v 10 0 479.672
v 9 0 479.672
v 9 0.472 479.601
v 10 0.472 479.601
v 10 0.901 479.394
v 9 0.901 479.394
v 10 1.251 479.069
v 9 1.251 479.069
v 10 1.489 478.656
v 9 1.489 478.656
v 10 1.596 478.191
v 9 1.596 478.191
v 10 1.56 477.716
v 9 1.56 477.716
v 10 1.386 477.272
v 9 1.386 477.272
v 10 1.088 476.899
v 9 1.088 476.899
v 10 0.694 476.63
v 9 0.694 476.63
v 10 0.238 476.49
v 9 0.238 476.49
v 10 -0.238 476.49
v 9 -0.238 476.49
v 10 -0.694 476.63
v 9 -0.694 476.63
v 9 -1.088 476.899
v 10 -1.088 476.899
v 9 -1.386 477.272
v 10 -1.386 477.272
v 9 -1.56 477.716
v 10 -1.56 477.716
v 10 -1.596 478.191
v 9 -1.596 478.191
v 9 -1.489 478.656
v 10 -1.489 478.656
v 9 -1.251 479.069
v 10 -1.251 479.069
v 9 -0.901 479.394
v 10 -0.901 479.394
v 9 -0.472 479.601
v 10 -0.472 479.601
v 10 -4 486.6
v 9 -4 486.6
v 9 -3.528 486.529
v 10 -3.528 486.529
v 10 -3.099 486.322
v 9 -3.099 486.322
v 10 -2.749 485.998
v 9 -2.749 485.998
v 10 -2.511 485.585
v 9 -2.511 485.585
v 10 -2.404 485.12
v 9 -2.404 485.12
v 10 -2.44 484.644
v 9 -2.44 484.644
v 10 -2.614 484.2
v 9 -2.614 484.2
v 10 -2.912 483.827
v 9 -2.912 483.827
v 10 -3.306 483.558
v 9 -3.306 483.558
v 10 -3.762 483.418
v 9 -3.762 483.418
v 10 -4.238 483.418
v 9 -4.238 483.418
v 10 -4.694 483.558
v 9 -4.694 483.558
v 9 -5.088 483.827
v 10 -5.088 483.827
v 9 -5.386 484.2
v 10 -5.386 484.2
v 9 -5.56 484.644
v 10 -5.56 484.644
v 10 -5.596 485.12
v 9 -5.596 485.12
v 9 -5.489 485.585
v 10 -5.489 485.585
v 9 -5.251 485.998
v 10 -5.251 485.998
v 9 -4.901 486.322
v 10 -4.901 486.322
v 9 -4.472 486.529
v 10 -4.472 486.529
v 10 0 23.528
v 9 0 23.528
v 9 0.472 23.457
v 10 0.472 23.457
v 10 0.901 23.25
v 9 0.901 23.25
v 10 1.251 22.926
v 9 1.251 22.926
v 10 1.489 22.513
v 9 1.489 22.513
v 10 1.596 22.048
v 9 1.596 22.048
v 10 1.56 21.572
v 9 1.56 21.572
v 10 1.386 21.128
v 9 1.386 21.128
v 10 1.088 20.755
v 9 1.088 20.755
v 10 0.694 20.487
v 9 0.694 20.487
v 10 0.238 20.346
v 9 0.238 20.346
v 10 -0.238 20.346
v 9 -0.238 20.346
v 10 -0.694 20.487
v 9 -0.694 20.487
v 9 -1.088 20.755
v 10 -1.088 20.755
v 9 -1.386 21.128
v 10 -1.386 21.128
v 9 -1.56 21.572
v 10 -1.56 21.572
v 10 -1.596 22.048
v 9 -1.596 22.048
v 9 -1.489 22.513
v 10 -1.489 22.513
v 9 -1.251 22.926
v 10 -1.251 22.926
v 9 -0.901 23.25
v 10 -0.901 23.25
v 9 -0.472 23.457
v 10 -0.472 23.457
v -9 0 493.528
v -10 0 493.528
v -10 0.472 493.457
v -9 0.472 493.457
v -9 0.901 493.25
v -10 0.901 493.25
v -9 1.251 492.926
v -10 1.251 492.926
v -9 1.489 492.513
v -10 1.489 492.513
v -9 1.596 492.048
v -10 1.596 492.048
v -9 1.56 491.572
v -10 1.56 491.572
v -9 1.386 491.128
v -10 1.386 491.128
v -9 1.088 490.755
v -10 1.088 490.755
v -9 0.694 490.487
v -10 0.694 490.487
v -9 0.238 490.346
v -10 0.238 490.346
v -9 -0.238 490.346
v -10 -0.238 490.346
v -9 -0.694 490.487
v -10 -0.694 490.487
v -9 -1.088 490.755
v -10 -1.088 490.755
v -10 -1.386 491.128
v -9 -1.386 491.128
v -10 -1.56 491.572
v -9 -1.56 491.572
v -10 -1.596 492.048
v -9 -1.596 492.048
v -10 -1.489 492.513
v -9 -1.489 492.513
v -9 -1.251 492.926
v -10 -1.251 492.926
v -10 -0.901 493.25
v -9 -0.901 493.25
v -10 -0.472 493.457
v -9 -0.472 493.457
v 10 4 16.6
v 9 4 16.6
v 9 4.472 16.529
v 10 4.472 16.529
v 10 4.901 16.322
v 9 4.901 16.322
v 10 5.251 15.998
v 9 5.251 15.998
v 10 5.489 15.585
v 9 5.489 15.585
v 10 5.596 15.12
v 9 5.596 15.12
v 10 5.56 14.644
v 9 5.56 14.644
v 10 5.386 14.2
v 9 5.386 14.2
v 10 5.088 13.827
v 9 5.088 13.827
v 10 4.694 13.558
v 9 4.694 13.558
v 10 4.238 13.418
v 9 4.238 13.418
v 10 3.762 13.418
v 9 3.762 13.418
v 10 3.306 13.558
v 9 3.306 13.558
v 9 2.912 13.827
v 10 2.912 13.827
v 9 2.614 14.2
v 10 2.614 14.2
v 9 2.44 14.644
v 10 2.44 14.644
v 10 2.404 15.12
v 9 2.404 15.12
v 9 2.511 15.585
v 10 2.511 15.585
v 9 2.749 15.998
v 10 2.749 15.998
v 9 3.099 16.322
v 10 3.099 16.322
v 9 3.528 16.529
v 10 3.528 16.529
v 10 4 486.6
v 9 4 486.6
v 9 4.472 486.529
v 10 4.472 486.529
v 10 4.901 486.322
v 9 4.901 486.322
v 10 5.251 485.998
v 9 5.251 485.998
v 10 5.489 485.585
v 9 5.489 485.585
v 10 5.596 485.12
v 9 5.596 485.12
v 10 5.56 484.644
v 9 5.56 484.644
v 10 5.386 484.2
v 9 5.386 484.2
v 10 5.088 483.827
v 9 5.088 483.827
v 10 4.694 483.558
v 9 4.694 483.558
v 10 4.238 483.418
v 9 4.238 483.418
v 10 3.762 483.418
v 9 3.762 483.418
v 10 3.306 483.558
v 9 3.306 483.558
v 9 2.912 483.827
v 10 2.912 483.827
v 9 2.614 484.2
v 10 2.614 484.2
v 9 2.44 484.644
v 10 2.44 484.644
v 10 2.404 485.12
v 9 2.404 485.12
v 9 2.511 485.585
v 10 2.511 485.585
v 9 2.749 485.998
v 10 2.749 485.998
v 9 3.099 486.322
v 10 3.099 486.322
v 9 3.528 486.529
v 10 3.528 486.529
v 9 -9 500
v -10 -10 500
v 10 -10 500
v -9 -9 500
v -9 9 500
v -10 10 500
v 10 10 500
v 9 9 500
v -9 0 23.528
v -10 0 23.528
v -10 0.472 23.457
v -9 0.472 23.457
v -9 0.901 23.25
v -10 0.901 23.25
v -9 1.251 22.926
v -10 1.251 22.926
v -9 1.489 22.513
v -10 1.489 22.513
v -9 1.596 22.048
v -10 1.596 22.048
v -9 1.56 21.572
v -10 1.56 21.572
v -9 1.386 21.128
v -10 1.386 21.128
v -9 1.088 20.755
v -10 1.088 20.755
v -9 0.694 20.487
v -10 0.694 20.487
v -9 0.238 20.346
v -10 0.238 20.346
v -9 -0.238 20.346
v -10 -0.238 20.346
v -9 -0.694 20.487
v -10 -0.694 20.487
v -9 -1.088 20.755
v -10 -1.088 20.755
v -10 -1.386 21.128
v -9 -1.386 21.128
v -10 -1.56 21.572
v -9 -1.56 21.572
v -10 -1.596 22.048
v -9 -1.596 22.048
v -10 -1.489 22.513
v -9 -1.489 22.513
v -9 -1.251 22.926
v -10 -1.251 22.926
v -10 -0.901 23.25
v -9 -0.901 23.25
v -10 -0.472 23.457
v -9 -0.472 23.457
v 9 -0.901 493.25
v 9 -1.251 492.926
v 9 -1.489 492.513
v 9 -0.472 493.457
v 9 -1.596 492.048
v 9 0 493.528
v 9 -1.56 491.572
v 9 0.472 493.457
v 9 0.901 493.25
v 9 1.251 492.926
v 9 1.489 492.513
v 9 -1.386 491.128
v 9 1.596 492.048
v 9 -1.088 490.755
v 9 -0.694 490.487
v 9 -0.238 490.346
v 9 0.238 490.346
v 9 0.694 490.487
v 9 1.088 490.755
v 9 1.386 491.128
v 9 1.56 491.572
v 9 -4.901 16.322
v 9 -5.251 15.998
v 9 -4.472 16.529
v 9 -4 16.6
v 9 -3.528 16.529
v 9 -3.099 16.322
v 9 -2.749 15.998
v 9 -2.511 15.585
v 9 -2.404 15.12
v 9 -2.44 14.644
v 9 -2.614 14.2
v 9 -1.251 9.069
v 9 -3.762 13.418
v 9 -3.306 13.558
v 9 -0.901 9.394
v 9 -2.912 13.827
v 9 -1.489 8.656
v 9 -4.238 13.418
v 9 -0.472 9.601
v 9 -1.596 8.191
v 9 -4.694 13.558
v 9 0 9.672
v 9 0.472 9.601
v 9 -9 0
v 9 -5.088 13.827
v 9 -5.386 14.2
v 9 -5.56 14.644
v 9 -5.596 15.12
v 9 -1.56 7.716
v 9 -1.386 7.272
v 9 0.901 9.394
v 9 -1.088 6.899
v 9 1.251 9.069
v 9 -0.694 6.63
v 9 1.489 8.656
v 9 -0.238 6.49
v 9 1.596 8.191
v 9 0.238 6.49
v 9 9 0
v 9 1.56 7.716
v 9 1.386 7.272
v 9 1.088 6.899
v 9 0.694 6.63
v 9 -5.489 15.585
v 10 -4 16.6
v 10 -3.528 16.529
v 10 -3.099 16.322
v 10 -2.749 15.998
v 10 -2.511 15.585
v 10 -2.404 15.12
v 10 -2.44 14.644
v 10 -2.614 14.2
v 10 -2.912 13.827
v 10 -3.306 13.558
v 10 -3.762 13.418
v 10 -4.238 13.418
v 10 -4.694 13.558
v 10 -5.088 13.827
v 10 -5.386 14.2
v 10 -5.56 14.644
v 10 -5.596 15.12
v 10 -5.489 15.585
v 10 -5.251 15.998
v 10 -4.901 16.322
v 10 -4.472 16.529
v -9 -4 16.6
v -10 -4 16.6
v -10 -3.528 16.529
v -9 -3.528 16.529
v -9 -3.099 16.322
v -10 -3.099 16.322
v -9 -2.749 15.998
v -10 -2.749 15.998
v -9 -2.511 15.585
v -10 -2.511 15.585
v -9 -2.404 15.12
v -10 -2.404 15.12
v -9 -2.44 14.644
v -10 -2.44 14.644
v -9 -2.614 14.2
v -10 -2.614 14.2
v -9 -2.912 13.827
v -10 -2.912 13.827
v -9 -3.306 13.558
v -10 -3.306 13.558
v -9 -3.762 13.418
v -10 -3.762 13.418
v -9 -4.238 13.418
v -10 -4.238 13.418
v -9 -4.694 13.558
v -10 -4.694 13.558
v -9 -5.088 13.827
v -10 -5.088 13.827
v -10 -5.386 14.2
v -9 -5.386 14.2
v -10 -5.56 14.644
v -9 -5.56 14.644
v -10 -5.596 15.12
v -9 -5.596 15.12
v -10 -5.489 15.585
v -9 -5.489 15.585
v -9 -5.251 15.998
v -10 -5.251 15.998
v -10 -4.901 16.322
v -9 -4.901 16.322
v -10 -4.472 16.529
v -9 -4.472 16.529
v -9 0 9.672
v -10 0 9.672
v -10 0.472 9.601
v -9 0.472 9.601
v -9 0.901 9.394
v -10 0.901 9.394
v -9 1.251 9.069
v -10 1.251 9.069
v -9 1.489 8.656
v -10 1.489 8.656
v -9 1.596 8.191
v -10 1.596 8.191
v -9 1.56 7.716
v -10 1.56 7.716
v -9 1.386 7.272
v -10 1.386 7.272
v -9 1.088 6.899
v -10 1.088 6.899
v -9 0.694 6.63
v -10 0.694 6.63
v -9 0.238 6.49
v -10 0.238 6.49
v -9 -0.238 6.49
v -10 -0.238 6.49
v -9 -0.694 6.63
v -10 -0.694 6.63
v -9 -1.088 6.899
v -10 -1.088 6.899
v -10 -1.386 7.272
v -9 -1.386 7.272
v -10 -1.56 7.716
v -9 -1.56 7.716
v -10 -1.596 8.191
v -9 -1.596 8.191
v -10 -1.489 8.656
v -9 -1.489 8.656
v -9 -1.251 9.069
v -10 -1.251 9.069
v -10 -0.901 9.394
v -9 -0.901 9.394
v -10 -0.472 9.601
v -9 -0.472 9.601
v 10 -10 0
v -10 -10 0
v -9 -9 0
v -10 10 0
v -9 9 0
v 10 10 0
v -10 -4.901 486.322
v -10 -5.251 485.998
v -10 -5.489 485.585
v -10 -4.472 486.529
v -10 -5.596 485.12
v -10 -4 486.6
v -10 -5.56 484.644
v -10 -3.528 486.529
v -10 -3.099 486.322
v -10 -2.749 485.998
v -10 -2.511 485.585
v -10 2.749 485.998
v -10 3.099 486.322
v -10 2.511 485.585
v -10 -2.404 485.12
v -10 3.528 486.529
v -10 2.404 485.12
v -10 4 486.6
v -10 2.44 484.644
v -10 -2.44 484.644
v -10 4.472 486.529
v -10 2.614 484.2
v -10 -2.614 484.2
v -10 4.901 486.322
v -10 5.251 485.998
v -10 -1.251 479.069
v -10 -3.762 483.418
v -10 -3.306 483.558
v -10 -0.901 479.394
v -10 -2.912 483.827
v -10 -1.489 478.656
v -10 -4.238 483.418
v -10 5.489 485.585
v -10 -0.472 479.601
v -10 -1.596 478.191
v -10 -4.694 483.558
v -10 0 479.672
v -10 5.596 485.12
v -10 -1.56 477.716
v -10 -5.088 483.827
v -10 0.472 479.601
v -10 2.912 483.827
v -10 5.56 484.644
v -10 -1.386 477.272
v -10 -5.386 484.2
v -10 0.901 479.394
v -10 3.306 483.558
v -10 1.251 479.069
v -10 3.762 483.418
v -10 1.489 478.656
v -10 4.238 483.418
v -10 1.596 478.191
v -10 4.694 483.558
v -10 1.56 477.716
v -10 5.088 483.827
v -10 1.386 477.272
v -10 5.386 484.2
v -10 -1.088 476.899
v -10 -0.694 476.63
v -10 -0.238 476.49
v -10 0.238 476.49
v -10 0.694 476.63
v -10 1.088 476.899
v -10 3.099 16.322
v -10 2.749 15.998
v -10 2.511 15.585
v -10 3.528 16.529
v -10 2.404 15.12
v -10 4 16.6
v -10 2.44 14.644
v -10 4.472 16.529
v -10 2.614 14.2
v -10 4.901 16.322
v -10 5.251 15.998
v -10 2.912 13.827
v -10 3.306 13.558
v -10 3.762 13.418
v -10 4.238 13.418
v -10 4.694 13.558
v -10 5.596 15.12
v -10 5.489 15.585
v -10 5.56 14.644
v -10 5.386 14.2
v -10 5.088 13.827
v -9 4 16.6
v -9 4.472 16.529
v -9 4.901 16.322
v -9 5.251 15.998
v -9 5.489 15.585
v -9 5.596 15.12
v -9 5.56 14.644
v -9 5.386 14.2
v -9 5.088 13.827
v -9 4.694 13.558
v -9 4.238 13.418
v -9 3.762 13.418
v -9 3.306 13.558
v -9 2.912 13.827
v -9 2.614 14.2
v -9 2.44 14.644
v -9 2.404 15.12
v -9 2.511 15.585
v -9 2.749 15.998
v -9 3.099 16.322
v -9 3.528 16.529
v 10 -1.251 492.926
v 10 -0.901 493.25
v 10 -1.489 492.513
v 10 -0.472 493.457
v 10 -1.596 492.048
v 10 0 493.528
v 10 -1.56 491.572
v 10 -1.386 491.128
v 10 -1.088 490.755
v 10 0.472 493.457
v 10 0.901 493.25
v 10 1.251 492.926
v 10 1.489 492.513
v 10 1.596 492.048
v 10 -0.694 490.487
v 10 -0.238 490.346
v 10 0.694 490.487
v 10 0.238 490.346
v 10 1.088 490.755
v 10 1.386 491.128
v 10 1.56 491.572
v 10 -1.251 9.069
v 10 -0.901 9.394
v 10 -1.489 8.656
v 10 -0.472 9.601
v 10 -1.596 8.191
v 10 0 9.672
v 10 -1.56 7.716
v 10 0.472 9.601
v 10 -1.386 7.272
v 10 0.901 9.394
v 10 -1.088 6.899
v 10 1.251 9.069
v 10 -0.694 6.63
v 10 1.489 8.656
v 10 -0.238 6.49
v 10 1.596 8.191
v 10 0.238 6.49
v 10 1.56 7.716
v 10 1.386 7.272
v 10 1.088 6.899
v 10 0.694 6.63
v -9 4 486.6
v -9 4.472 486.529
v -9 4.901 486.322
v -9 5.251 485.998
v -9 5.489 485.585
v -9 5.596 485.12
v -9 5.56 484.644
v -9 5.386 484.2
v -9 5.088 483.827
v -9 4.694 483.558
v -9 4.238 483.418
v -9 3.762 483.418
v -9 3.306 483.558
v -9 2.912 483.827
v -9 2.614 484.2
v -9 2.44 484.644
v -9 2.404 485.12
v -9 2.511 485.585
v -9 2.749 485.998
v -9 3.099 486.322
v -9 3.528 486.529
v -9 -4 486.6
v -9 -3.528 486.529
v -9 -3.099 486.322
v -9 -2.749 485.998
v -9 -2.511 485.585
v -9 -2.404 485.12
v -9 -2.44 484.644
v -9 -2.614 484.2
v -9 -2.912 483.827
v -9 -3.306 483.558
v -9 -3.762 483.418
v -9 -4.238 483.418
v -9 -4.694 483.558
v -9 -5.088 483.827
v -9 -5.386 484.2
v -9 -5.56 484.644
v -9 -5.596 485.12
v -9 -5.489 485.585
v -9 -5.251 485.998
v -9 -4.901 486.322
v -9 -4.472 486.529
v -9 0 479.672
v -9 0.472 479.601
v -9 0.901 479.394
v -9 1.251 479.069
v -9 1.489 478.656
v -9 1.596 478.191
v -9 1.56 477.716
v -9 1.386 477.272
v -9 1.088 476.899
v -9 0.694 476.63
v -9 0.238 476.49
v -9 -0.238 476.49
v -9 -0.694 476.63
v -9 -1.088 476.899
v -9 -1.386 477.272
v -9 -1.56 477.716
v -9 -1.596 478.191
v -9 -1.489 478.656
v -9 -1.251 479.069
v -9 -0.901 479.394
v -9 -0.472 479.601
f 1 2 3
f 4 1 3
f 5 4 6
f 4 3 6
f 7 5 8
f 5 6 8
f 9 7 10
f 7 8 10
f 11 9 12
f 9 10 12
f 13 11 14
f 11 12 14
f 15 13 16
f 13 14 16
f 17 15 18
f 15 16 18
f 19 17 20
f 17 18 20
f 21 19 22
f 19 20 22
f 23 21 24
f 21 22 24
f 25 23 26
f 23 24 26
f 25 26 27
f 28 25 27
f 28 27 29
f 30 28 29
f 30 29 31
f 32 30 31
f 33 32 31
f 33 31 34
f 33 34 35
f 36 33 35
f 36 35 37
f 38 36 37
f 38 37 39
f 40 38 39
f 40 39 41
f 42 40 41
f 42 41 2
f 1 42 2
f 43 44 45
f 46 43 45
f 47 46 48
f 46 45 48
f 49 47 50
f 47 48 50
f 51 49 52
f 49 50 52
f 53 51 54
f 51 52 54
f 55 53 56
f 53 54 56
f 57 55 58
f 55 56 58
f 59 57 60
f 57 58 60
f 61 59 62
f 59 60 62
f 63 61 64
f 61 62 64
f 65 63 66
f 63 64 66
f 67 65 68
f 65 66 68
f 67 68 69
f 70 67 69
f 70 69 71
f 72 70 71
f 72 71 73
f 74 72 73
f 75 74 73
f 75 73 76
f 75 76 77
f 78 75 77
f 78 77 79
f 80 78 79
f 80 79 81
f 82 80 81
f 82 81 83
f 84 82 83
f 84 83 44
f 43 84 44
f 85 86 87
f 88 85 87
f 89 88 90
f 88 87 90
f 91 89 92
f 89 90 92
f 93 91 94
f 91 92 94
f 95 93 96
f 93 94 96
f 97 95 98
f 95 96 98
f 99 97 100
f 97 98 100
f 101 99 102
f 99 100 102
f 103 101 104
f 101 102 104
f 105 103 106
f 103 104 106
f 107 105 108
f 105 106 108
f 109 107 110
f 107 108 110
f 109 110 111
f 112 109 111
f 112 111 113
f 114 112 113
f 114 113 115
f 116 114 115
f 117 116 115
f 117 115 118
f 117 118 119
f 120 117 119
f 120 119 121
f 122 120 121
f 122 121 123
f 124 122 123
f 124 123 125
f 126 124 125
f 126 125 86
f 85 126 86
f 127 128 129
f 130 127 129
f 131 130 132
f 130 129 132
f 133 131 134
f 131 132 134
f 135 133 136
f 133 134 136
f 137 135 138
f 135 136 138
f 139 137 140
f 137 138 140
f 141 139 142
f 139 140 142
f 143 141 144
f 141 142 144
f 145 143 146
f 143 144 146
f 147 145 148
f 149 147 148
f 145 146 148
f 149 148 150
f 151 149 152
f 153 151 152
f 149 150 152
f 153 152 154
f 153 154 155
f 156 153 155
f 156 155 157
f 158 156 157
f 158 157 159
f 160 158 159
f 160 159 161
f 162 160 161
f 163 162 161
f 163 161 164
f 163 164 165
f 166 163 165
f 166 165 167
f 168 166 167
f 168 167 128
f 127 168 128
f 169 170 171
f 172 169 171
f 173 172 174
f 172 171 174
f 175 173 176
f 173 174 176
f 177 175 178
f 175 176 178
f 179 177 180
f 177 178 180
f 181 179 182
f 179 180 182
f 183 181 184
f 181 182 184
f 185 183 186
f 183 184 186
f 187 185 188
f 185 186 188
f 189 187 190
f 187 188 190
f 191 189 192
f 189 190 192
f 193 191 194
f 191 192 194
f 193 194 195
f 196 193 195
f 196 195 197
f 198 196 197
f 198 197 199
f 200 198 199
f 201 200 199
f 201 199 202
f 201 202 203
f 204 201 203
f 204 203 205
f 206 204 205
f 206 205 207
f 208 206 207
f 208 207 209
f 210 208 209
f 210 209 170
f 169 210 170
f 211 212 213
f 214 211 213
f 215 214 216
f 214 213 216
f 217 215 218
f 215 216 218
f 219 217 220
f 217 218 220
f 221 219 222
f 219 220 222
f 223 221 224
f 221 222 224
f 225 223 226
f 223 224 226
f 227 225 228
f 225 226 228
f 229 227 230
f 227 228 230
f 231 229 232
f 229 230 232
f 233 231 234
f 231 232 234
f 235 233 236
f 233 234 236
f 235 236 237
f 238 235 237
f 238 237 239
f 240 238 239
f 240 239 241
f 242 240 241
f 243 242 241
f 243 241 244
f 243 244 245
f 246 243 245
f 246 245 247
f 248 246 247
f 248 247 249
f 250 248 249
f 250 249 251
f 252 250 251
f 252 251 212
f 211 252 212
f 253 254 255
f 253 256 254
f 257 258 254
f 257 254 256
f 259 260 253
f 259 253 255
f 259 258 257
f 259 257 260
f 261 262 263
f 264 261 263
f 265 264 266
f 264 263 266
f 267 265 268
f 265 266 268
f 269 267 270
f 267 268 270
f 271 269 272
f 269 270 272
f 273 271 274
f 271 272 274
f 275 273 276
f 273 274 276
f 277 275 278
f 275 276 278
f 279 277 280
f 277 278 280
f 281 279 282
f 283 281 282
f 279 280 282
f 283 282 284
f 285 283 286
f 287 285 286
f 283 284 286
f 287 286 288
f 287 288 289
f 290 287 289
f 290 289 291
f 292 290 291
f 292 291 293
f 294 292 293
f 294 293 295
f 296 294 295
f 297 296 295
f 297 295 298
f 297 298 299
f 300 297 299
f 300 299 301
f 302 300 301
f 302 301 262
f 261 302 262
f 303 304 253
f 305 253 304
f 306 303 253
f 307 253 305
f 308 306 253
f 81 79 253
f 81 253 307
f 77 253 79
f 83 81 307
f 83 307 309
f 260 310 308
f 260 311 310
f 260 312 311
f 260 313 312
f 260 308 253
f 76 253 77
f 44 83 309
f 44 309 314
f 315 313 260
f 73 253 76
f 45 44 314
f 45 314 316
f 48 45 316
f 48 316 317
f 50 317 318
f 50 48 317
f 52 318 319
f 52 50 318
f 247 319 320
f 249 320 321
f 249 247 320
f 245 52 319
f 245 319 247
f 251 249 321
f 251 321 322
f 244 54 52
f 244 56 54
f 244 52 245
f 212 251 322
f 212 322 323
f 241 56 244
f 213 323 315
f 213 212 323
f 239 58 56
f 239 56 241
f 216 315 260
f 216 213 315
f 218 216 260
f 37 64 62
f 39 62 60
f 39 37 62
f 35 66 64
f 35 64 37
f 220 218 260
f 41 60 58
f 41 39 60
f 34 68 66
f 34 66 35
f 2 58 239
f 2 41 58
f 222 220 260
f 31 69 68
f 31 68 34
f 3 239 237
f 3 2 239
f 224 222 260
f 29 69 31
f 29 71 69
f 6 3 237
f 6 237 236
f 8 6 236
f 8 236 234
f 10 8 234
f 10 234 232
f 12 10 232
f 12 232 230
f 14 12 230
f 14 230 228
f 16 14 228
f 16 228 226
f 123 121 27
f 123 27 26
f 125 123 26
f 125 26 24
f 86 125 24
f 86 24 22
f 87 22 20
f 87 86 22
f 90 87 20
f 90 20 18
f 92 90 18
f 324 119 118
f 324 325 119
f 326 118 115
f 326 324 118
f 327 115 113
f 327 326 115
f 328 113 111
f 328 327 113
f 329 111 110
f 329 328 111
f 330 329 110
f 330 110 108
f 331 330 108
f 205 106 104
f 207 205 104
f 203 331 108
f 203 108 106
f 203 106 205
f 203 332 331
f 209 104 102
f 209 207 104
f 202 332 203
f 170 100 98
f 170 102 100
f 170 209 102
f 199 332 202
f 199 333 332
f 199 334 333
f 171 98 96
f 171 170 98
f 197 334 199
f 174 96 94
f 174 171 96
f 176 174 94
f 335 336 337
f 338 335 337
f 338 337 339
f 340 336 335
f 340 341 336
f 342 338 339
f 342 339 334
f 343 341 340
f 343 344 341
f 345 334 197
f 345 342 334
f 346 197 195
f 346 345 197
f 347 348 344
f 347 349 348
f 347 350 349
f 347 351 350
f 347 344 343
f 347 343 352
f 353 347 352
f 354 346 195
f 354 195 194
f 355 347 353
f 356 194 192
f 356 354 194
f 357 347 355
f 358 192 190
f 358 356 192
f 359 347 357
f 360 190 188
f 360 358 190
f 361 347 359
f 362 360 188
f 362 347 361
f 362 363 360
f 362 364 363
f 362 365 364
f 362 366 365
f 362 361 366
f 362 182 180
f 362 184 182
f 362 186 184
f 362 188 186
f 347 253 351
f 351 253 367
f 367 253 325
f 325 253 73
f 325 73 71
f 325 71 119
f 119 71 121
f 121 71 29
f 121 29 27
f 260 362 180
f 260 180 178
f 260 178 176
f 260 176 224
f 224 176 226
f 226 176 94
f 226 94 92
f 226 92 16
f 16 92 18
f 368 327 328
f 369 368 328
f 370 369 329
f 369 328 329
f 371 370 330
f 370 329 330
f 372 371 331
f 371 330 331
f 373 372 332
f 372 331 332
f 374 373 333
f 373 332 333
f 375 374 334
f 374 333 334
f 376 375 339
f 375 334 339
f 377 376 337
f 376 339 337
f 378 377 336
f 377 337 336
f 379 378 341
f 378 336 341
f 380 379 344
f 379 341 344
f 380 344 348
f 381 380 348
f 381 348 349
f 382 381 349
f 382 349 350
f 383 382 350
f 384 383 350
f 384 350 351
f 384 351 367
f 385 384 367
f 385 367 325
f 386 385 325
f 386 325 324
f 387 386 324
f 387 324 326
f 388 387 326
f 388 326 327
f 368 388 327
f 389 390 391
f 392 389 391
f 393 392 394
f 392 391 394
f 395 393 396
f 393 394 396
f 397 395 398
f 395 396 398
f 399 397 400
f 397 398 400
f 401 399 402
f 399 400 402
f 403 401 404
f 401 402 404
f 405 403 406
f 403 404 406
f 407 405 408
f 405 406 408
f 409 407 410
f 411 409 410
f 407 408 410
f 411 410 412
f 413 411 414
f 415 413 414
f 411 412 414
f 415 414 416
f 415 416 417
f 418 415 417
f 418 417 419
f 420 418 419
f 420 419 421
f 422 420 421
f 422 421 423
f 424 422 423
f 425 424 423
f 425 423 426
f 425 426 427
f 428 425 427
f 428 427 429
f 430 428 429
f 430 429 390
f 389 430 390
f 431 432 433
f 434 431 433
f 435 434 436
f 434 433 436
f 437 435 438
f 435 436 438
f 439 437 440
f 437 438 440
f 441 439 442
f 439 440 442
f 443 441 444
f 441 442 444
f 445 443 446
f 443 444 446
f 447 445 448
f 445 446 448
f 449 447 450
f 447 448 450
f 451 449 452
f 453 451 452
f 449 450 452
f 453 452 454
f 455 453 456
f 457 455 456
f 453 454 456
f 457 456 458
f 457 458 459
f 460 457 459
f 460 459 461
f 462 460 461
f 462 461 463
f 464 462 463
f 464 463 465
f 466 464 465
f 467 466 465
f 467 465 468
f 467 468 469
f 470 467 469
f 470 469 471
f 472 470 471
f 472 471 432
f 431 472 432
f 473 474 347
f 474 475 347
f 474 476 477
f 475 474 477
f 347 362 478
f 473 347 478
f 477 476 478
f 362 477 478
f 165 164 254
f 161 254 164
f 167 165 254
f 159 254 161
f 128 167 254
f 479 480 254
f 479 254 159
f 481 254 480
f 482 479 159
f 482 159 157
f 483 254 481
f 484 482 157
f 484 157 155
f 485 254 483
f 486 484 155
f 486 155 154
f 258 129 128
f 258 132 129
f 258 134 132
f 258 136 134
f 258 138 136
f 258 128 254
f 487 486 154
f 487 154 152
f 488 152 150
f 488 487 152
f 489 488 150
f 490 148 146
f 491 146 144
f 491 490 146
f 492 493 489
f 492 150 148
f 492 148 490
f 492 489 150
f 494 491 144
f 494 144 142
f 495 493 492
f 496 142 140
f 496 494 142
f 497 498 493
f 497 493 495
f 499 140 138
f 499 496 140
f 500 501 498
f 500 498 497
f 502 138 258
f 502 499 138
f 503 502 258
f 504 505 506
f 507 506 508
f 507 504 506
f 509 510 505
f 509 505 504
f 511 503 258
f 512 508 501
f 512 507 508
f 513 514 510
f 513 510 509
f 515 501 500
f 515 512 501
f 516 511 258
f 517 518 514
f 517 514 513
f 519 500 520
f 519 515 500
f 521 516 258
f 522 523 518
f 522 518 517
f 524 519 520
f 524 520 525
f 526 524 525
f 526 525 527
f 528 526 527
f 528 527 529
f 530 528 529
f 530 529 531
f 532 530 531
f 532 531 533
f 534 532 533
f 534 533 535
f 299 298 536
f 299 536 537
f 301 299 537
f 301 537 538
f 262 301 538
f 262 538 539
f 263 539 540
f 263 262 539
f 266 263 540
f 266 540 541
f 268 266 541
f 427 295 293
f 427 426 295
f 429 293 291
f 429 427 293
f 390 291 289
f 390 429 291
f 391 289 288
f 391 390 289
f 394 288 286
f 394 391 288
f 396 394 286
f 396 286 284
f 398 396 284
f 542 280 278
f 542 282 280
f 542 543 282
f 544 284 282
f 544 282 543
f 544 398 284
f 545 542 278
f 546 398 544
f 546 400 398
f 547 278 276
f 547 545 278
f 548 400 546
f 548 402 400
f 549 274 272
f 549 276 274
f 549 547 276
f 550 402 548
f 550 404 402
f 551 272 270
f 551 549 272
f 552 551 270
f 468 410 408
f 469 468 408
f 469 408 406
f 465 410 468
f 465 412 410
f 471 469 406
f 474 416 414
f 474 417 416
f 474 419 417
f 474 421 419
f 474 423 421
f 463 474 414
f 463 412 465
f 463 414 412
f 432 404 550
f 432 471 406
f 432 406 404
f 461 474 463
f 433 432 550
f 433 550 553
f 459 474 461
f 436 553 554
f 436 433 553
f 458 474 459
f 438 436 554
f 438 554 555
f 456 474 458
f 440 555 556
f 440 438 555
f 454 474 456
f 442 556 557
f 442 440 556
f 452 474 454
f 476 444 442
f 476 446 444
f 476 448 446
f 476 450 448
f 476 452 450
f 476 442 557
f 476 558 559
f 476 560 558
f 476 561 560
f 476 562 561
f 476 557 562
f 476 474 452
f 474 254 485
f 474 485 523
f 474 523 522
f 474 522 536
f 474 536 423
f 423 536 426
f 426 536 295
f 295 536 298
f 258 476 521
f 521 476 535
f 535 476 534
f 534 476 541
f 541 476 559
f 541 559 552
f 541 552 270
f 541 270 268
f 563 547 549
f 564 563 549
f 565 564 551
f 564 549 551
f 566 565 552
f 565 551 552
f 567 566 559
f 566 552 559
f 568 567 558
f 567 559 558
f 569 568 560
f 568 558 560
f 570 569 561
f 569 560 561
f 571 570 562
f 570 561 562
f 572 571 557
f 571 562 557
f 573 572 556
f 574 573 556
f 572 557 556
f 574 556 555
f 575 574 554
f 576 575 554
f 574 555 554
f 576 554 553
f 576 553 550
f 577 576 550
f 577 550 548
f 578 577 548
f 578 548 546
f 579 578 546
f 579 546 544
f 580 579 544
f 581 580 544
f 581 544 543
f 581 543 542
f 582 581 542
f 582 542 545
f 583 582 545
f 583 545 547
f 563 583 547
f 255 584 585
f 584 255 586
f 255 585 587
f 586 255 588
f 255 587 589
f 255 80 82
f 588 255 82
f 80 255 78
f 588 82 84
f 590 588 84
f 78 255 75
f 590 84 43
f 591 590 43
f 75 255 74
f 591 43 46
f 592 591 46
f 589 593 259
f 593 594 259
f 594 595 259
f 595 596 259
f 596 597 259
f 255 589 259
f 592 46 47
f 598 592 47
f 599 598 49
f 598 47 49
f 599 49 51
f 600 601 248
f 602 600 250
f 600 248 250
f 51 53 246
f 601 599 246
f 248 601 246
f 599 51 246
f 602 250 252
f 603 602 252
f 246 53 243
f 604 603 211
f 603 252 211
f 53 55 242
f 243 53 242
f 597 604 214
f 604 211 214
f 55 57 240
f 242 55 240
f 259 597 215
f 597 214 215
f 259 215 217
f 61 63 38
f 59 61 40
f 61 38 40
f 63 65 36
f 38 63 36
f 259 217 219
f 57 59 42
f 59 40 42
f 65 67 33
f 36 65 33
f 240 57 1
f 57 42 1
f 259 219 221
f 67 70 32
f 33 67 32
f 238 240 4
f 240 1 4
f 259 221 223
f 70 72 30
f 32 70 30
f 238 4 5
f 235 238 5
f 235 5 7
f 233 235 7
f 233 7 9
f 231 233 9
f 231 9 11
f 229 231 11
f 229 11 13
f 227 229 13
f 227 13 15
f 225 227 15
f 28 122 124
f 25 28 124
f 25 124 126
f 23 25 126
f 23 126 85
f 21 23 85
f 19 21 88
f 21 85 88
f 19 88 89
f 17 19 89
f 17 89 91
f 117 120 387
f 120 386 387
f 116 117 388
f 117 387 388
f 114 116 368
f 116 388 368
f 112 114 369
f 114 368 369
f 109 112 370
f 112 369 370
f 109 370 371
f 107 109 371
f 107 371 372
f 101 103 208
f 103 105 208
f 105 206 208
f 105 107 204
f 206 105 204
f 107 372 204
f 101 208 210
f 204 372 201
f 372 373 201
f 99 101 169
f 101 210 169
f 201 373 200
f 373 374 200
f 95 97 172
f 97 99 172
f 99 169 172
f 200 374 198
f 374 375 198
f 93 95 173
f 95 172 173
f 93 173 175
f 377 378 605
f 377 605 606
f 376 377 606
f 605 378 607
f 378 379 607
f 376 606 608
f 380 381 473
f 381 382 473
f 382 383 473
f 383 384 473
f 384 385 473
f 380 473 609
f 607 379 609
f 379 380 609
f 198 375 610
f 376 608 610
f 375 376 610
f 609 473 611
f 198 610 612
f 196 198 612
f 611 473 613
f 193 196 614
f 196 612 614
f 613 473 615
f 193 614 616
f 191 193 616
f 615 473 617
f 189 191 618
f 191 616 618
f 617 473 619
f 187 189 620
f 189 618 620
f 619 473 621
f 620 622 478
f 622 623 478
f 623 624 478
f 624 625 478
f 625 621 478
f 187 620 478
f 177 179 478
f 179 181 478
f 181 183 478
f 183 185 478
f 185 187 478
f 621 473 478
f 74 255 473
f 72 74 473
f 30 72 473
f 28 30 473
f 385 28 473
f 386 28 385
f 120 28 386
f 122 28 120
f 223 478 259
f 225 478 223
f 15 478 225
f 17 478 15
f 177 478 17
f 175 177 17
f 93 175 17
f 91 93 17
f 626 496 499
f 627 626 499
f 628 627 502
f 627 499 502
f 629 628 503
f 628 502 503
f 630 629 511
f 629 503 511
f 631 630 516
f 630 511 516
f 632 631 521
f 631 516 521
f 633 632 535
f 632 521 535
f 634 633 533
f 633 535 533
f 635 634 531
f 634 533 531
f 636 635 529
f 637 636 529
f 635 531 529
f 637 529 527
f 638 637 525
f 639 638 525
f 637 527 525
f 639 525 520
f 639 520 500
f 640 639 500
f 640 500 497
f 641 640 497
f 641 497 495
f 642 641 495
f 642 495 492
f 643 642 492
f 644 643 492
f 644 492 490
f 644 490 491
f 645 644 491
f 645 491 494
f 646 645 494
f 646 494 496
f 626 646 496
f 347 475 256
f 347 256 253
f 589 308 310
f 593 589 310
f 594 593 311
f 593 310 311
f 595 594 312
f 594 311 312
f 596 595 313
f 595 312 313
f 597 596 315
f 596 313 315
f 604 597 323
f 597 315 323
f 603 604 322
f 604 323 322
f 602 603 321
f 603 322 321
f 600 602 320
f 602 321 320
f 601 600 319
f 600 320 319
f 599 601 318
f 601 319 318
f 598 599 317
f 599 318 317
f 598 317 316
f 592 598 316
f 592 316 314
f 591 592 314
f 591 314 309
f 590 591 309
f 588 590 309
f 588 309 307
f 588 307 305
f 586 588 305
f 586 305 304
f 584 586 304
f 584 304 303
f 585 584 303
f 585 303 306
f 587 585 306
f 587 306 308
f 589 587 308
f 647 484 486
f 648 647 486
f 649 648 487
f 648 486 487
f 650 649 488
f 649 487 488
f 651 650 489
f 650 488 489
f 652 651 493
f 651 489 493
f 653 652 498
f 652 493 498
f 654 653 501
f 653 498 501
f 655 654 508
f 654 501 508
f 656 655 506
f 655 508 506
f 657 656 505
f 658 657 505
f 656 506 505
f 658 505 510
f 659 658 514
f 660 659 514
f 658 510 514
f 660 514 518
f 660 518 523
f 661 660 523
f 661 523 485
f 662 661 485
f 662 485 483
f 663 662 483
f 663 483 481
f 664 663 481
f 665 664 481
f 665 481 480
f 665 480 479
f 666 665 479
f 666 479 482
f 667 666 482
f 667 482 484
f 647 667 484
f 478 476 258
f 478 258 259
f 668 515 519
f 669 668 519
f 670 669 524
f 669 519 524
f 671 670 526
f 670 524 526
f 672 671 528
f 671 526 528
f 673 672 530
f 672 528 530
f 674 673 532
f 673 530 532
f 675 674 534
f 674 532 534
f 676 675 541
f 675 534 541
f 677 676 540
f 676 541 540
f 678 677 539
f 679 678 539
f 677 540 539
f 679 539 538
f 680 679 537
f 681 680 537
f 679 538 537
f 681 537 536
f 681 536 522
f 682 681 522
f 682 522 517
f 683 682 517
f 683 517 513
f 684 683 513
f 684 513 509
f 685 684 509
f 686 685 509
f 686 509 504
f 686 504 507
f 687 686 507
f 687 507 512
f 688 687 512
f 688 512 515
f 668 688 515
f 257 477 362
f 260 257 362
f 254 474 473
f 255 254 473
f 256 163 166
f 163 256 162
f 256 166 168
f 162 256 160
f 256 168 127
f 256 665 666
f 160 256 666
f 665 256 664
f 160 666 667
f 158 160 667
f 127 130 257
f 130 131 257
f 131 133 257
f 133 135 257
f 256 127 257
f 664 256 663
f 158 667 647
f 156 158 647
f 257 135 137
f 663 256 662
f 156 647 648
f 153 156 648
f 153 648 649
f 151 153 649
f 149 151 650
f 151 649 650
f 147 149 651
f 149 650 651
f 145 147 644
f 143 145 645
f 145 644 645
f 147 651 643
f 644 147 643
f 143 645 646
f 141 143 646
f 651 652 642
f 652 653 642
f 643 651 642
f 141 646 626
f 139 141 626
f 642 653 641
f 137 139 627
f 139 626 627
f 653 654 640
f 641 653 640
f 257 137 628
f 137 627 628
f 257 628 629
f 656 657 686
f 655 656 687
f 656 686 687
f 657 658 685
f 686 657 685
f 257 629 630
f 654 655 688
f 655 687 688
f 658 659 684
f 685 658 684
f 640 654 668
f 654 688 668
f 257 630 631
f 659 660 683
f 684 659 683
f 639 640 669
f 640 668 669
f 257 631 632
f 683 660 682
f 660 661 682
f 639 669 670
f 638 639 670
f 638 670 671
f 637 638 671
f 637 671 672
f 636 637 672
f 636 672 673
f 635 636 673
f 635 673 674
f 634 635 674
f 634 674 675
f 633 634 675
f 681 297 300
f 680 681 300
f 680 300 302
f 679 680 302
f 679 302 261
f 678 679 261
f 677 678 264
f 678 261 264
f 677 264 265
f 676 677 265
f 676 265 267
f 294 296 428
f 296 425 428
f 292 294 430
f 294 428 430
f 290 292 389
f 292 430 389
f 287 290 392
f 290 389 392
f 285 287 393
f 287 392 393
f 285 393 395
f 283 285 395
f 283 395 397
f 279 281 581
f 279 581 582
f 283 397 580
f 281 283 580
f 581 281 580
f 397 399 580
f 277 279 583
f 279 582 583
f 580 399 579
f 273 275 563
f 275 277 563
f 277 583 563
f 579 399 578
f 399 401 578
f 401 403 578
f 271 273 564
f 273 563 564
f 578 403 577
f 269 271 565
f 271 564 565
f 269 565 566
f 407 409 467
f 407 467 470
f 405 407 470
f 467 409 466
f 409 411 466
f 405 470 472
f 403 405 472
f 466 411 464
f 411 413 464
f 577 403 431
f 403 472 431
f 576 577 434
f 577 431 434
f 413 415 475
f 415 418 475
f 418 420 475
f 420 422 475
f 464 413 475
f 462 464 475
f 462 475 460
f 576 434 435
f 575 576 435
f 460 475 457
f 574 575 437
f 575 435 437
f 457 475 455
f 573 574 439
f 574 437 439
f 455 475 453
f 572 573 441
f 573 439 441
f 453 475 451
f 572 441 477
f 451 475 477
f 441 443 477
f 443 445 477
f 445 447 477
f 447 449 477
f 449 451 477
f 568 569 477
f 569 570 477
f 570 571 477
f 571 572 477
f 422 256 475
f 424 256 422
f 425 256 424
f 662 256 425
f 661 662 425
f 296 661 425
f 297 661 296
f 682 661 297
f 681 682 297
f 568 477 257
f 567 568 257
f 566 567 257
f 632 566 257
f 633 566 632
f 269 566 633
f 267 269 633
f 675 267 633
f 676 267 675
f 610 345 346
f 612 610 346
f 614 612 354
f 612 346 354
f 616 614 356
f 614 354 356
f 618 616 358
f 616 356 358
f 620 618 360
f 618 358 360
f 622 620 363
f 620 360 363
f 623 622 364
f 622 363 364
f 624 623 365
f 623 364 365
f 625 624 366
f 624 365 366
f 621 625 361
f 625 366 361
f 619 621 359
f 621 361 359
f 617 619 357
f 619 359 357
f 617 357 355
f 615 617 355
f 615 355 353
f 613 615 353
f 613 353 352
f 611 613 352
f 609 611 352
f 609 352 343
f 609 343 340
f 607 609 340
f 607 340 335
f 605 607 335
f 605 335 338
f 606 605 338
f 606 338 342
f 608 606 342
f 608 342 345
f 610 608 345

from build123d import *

# Parameters (mm, degrees)
SKETCH_1_W          = 20
SKETCH_1_H          = 20
SKETCH_1_W_2        = 18
SKETCH_1_H_2        = 18
EXTRUDE_1_DEPTH     = 500
CUT_EXTRUDE_1_REACH = 502.5
SKETCH_2_R          = 1.6


with BuildPart() as part:
    # 草图1 → 凸台-拉伸1 (new body)
    with BuildSketch(Plane.XY):
        Rectangle(SKETCH_1_W, SKETCH_1_H)
        Rectangle(SKETCH_1_W_2, SKETCH_1_H_2, mode=Mode.SUBTRACT)
    extrude(amount=EXTRUDE_1_DEPTH)

    # 切除-拉伸1: up to this face of the body (flat: up to its plane)
    cut_extrude_1_end = Plane(part.part.faces().sort_by_distance((10, 0, 250))[0])
    # 草图2 → 切除-拉伸1 (cut, up to the picked face)
    with BuildSketch(Plane.ZY.offset(10), mode=Mode.PRIVATE) as cut_extrude_1_sk1:
        with Locations((15, -4)):
            Circle(SKETCH_2_R)
    cut_extrude_1_tool1 = split(extrude(cut_extrude_1_sk1.sketch, amount=-CUT_EXTRUDE_1_REACH, mode=Mode.PRIVATE), bisect_by=cut_extrude_1_end, keep=Keep.BOTH, mode=Mode.PRIVATE)
    # 草图2 → 切除-拉伸1 (cut, up to the picked face)
    with BuildSketch(Plane.ZY.offset(10), mode=Mode.PRIVATE) as cut_extrude_1_sk2:
        with Locations((15, 4)):
            Circle(SKETCH_2_R)
    cut_extrude_1_tool2 = split(extrude(cut_extrude_1_sk2.sketch, amount=-CUT_EXTRUDE_1_REACH, mode=Mode.PRIVATE), bisect_by=cut_extrude_1_end, keep=Keep.BOTH, mode=Mode.PRIVATE)
    # 草图2 → 切除-拉伸1 (cut, up to the picked face)
    with BuildSketch(Plane.ZY.offset(10), mode=Mode.PRIVATE) as cut_extrude_1_sk3:
        with Locations((8.07179677, 0)):
            Circle(SKETCH_2_R)
    cut_extrude_1_tool3 = split(extrude(cut_extrude_1_sk3.sketch, amount=-CUT_EXTRUDE_1_REACH, mode=Mode.PRIVATE), bisect_by=cut_extrude_1_end, keep=Keep.BOTH, mode=Mode.PRIVATE)
    # 草图2 → 切除-拉伸1 (cut, up to the picked face)
    with BuildSketch(Plane.ZY.offset(10), mode=Mode.PRIVATE) as cut_extrude_1_sk4:
        with Locations((21.92820323, 0)):
            Circle(SKETCH_2_R)
    cut_extrude_1_tool4 = split(extrude(cut_extrude_1_sk4.sketch, amount=-CUT_EXTRUDE_1_REACH, mode=Mode.PRIVATE), bisect_by=cut_extrude_1_end, keep=Keep.BOTH, mode=Mode.PRIVATE)
    # 草图2 → 切除-拉伸1 (cut, up to the picked face)
    with BuildSketch(Plane.ZY.offset(10), mode=Mode.PRIVATE) as cut_extrude_1_sk5:
        with Locations((478.07179677, 0)):
            Circle(SKETCH_2_R)
    cut_extrude_1_tool5 = split(extrude(cut_extrude_1_sk5.sketch, amount=-CUT_EXTRUDE_1_REACH, mode=Mode.PRIVATE), bisect_by=cut_extrude_1_end, keep=Keep.BOTH, mode=Mode.PRIVATE)
    # 草图2 → 切除-拉伸1 (cut, up to the picked face)
    with BuildSketch(Plane.ZY.offset(10), mode=Mode.PRIVATE) as cut_extrude_1_sk6:
        with Locations((485, 4)):
            Circle(SKETCH_2_R)
    cut_extrude_1_tool6 = split(extrude(cut_extrude_1_sk6.sketch, amount=-CUT_EXTRUDE_1_REACH, mode=Mode.PRIVATE), bisect_by=cut_extrude_1_end, keep=Keep.BOTH, mode=Mode.PRIVATE)
    # 草图2 → 切除-拉伸1 (cut, up to the picked face)
    with BuildSketch(Plane.ZY.offset(10), mode=Mode.PRIVATE) as cut_extrude_1_sk7:
        with Locations((485, -4)):
            Circle(SKETCH_2_R)
    cut_extrude_1_tool7 = split(extrude(cut_extrude_1_sk7.sketch, amount=-CUT_EXTRUDE_1_REACH, mode=Mode.PRIVATE), bisect_by=cut_extrude_1_end, keep=Keep.BOTH, mode=Mode.PRIVATE)
    # 草图2 → 切除-拉伸1 (cut, up to the picked face)
    with BuildSketch(Plane.ZY.offset(10), mode=Mode.PRIVATE) as cut_extrude_1_sk8:
        with Locations((491.92820323, 0)):
            Circle(SKETCH_2_R)
    cut_extrude_1_tool8 = split(extrude(cut_extrude_1_sk8.sketch, amount=-CUT_EXTRUDE_1_REACH, mode=Mode.PRIVATE), bisect_by=cut_extrude_1_end, keep=Keep.BOTH, mode=Mode.PRIVATE)
    add(cut_extrude_1_tool1.solids().sort_by(Axis((-10, -4, 15), (1, 0, 0)))[0], mode=Mode.SUBTRACT)
    add(cut_extrude_1_tool2.solids().sort_by(Axis((-10, 4, 15), (1, 0, 0)))[0], mode=Mode.SUBTRACT)
    add(cut_extrude_1_tool3.solids().sort_by(Axis((-10, 0, 8.071797), (1, 0, 0)))[0], mode=Mode.SUBTRACT)
    add(cut_extrude_1_tool4.solids().sort_by(Axis((-10, 0, 21.928203), (1, 0, 0)))[0], mode=Mode.SUBTRACT)
    add(cut_extrude_1_tool5.solids().sort_by(Axis((-10, 0, 478.071797), (1, 0, 0)))[0], mode=Mode.SUBTRACT)
    add(cut_extrude_1_tool6.solids().sort_by(Axis((-10, 4, 485), (1, 0, 0)))[0], mode=Mode.SUBTRACT)
    add(cut_extrude_1_tool7.solids().sort_by(Axis((-10, -4, 485), (1, 0, 0)))[0], mode=Mode.SUBTRACT)
    add(cut_extrude_1_tool8.solids().sort_by(Axis((-10, 0, 491.928203), (1, 0, 0)))[0], mode=Mode.SUBTRACT)


solid = part.part
